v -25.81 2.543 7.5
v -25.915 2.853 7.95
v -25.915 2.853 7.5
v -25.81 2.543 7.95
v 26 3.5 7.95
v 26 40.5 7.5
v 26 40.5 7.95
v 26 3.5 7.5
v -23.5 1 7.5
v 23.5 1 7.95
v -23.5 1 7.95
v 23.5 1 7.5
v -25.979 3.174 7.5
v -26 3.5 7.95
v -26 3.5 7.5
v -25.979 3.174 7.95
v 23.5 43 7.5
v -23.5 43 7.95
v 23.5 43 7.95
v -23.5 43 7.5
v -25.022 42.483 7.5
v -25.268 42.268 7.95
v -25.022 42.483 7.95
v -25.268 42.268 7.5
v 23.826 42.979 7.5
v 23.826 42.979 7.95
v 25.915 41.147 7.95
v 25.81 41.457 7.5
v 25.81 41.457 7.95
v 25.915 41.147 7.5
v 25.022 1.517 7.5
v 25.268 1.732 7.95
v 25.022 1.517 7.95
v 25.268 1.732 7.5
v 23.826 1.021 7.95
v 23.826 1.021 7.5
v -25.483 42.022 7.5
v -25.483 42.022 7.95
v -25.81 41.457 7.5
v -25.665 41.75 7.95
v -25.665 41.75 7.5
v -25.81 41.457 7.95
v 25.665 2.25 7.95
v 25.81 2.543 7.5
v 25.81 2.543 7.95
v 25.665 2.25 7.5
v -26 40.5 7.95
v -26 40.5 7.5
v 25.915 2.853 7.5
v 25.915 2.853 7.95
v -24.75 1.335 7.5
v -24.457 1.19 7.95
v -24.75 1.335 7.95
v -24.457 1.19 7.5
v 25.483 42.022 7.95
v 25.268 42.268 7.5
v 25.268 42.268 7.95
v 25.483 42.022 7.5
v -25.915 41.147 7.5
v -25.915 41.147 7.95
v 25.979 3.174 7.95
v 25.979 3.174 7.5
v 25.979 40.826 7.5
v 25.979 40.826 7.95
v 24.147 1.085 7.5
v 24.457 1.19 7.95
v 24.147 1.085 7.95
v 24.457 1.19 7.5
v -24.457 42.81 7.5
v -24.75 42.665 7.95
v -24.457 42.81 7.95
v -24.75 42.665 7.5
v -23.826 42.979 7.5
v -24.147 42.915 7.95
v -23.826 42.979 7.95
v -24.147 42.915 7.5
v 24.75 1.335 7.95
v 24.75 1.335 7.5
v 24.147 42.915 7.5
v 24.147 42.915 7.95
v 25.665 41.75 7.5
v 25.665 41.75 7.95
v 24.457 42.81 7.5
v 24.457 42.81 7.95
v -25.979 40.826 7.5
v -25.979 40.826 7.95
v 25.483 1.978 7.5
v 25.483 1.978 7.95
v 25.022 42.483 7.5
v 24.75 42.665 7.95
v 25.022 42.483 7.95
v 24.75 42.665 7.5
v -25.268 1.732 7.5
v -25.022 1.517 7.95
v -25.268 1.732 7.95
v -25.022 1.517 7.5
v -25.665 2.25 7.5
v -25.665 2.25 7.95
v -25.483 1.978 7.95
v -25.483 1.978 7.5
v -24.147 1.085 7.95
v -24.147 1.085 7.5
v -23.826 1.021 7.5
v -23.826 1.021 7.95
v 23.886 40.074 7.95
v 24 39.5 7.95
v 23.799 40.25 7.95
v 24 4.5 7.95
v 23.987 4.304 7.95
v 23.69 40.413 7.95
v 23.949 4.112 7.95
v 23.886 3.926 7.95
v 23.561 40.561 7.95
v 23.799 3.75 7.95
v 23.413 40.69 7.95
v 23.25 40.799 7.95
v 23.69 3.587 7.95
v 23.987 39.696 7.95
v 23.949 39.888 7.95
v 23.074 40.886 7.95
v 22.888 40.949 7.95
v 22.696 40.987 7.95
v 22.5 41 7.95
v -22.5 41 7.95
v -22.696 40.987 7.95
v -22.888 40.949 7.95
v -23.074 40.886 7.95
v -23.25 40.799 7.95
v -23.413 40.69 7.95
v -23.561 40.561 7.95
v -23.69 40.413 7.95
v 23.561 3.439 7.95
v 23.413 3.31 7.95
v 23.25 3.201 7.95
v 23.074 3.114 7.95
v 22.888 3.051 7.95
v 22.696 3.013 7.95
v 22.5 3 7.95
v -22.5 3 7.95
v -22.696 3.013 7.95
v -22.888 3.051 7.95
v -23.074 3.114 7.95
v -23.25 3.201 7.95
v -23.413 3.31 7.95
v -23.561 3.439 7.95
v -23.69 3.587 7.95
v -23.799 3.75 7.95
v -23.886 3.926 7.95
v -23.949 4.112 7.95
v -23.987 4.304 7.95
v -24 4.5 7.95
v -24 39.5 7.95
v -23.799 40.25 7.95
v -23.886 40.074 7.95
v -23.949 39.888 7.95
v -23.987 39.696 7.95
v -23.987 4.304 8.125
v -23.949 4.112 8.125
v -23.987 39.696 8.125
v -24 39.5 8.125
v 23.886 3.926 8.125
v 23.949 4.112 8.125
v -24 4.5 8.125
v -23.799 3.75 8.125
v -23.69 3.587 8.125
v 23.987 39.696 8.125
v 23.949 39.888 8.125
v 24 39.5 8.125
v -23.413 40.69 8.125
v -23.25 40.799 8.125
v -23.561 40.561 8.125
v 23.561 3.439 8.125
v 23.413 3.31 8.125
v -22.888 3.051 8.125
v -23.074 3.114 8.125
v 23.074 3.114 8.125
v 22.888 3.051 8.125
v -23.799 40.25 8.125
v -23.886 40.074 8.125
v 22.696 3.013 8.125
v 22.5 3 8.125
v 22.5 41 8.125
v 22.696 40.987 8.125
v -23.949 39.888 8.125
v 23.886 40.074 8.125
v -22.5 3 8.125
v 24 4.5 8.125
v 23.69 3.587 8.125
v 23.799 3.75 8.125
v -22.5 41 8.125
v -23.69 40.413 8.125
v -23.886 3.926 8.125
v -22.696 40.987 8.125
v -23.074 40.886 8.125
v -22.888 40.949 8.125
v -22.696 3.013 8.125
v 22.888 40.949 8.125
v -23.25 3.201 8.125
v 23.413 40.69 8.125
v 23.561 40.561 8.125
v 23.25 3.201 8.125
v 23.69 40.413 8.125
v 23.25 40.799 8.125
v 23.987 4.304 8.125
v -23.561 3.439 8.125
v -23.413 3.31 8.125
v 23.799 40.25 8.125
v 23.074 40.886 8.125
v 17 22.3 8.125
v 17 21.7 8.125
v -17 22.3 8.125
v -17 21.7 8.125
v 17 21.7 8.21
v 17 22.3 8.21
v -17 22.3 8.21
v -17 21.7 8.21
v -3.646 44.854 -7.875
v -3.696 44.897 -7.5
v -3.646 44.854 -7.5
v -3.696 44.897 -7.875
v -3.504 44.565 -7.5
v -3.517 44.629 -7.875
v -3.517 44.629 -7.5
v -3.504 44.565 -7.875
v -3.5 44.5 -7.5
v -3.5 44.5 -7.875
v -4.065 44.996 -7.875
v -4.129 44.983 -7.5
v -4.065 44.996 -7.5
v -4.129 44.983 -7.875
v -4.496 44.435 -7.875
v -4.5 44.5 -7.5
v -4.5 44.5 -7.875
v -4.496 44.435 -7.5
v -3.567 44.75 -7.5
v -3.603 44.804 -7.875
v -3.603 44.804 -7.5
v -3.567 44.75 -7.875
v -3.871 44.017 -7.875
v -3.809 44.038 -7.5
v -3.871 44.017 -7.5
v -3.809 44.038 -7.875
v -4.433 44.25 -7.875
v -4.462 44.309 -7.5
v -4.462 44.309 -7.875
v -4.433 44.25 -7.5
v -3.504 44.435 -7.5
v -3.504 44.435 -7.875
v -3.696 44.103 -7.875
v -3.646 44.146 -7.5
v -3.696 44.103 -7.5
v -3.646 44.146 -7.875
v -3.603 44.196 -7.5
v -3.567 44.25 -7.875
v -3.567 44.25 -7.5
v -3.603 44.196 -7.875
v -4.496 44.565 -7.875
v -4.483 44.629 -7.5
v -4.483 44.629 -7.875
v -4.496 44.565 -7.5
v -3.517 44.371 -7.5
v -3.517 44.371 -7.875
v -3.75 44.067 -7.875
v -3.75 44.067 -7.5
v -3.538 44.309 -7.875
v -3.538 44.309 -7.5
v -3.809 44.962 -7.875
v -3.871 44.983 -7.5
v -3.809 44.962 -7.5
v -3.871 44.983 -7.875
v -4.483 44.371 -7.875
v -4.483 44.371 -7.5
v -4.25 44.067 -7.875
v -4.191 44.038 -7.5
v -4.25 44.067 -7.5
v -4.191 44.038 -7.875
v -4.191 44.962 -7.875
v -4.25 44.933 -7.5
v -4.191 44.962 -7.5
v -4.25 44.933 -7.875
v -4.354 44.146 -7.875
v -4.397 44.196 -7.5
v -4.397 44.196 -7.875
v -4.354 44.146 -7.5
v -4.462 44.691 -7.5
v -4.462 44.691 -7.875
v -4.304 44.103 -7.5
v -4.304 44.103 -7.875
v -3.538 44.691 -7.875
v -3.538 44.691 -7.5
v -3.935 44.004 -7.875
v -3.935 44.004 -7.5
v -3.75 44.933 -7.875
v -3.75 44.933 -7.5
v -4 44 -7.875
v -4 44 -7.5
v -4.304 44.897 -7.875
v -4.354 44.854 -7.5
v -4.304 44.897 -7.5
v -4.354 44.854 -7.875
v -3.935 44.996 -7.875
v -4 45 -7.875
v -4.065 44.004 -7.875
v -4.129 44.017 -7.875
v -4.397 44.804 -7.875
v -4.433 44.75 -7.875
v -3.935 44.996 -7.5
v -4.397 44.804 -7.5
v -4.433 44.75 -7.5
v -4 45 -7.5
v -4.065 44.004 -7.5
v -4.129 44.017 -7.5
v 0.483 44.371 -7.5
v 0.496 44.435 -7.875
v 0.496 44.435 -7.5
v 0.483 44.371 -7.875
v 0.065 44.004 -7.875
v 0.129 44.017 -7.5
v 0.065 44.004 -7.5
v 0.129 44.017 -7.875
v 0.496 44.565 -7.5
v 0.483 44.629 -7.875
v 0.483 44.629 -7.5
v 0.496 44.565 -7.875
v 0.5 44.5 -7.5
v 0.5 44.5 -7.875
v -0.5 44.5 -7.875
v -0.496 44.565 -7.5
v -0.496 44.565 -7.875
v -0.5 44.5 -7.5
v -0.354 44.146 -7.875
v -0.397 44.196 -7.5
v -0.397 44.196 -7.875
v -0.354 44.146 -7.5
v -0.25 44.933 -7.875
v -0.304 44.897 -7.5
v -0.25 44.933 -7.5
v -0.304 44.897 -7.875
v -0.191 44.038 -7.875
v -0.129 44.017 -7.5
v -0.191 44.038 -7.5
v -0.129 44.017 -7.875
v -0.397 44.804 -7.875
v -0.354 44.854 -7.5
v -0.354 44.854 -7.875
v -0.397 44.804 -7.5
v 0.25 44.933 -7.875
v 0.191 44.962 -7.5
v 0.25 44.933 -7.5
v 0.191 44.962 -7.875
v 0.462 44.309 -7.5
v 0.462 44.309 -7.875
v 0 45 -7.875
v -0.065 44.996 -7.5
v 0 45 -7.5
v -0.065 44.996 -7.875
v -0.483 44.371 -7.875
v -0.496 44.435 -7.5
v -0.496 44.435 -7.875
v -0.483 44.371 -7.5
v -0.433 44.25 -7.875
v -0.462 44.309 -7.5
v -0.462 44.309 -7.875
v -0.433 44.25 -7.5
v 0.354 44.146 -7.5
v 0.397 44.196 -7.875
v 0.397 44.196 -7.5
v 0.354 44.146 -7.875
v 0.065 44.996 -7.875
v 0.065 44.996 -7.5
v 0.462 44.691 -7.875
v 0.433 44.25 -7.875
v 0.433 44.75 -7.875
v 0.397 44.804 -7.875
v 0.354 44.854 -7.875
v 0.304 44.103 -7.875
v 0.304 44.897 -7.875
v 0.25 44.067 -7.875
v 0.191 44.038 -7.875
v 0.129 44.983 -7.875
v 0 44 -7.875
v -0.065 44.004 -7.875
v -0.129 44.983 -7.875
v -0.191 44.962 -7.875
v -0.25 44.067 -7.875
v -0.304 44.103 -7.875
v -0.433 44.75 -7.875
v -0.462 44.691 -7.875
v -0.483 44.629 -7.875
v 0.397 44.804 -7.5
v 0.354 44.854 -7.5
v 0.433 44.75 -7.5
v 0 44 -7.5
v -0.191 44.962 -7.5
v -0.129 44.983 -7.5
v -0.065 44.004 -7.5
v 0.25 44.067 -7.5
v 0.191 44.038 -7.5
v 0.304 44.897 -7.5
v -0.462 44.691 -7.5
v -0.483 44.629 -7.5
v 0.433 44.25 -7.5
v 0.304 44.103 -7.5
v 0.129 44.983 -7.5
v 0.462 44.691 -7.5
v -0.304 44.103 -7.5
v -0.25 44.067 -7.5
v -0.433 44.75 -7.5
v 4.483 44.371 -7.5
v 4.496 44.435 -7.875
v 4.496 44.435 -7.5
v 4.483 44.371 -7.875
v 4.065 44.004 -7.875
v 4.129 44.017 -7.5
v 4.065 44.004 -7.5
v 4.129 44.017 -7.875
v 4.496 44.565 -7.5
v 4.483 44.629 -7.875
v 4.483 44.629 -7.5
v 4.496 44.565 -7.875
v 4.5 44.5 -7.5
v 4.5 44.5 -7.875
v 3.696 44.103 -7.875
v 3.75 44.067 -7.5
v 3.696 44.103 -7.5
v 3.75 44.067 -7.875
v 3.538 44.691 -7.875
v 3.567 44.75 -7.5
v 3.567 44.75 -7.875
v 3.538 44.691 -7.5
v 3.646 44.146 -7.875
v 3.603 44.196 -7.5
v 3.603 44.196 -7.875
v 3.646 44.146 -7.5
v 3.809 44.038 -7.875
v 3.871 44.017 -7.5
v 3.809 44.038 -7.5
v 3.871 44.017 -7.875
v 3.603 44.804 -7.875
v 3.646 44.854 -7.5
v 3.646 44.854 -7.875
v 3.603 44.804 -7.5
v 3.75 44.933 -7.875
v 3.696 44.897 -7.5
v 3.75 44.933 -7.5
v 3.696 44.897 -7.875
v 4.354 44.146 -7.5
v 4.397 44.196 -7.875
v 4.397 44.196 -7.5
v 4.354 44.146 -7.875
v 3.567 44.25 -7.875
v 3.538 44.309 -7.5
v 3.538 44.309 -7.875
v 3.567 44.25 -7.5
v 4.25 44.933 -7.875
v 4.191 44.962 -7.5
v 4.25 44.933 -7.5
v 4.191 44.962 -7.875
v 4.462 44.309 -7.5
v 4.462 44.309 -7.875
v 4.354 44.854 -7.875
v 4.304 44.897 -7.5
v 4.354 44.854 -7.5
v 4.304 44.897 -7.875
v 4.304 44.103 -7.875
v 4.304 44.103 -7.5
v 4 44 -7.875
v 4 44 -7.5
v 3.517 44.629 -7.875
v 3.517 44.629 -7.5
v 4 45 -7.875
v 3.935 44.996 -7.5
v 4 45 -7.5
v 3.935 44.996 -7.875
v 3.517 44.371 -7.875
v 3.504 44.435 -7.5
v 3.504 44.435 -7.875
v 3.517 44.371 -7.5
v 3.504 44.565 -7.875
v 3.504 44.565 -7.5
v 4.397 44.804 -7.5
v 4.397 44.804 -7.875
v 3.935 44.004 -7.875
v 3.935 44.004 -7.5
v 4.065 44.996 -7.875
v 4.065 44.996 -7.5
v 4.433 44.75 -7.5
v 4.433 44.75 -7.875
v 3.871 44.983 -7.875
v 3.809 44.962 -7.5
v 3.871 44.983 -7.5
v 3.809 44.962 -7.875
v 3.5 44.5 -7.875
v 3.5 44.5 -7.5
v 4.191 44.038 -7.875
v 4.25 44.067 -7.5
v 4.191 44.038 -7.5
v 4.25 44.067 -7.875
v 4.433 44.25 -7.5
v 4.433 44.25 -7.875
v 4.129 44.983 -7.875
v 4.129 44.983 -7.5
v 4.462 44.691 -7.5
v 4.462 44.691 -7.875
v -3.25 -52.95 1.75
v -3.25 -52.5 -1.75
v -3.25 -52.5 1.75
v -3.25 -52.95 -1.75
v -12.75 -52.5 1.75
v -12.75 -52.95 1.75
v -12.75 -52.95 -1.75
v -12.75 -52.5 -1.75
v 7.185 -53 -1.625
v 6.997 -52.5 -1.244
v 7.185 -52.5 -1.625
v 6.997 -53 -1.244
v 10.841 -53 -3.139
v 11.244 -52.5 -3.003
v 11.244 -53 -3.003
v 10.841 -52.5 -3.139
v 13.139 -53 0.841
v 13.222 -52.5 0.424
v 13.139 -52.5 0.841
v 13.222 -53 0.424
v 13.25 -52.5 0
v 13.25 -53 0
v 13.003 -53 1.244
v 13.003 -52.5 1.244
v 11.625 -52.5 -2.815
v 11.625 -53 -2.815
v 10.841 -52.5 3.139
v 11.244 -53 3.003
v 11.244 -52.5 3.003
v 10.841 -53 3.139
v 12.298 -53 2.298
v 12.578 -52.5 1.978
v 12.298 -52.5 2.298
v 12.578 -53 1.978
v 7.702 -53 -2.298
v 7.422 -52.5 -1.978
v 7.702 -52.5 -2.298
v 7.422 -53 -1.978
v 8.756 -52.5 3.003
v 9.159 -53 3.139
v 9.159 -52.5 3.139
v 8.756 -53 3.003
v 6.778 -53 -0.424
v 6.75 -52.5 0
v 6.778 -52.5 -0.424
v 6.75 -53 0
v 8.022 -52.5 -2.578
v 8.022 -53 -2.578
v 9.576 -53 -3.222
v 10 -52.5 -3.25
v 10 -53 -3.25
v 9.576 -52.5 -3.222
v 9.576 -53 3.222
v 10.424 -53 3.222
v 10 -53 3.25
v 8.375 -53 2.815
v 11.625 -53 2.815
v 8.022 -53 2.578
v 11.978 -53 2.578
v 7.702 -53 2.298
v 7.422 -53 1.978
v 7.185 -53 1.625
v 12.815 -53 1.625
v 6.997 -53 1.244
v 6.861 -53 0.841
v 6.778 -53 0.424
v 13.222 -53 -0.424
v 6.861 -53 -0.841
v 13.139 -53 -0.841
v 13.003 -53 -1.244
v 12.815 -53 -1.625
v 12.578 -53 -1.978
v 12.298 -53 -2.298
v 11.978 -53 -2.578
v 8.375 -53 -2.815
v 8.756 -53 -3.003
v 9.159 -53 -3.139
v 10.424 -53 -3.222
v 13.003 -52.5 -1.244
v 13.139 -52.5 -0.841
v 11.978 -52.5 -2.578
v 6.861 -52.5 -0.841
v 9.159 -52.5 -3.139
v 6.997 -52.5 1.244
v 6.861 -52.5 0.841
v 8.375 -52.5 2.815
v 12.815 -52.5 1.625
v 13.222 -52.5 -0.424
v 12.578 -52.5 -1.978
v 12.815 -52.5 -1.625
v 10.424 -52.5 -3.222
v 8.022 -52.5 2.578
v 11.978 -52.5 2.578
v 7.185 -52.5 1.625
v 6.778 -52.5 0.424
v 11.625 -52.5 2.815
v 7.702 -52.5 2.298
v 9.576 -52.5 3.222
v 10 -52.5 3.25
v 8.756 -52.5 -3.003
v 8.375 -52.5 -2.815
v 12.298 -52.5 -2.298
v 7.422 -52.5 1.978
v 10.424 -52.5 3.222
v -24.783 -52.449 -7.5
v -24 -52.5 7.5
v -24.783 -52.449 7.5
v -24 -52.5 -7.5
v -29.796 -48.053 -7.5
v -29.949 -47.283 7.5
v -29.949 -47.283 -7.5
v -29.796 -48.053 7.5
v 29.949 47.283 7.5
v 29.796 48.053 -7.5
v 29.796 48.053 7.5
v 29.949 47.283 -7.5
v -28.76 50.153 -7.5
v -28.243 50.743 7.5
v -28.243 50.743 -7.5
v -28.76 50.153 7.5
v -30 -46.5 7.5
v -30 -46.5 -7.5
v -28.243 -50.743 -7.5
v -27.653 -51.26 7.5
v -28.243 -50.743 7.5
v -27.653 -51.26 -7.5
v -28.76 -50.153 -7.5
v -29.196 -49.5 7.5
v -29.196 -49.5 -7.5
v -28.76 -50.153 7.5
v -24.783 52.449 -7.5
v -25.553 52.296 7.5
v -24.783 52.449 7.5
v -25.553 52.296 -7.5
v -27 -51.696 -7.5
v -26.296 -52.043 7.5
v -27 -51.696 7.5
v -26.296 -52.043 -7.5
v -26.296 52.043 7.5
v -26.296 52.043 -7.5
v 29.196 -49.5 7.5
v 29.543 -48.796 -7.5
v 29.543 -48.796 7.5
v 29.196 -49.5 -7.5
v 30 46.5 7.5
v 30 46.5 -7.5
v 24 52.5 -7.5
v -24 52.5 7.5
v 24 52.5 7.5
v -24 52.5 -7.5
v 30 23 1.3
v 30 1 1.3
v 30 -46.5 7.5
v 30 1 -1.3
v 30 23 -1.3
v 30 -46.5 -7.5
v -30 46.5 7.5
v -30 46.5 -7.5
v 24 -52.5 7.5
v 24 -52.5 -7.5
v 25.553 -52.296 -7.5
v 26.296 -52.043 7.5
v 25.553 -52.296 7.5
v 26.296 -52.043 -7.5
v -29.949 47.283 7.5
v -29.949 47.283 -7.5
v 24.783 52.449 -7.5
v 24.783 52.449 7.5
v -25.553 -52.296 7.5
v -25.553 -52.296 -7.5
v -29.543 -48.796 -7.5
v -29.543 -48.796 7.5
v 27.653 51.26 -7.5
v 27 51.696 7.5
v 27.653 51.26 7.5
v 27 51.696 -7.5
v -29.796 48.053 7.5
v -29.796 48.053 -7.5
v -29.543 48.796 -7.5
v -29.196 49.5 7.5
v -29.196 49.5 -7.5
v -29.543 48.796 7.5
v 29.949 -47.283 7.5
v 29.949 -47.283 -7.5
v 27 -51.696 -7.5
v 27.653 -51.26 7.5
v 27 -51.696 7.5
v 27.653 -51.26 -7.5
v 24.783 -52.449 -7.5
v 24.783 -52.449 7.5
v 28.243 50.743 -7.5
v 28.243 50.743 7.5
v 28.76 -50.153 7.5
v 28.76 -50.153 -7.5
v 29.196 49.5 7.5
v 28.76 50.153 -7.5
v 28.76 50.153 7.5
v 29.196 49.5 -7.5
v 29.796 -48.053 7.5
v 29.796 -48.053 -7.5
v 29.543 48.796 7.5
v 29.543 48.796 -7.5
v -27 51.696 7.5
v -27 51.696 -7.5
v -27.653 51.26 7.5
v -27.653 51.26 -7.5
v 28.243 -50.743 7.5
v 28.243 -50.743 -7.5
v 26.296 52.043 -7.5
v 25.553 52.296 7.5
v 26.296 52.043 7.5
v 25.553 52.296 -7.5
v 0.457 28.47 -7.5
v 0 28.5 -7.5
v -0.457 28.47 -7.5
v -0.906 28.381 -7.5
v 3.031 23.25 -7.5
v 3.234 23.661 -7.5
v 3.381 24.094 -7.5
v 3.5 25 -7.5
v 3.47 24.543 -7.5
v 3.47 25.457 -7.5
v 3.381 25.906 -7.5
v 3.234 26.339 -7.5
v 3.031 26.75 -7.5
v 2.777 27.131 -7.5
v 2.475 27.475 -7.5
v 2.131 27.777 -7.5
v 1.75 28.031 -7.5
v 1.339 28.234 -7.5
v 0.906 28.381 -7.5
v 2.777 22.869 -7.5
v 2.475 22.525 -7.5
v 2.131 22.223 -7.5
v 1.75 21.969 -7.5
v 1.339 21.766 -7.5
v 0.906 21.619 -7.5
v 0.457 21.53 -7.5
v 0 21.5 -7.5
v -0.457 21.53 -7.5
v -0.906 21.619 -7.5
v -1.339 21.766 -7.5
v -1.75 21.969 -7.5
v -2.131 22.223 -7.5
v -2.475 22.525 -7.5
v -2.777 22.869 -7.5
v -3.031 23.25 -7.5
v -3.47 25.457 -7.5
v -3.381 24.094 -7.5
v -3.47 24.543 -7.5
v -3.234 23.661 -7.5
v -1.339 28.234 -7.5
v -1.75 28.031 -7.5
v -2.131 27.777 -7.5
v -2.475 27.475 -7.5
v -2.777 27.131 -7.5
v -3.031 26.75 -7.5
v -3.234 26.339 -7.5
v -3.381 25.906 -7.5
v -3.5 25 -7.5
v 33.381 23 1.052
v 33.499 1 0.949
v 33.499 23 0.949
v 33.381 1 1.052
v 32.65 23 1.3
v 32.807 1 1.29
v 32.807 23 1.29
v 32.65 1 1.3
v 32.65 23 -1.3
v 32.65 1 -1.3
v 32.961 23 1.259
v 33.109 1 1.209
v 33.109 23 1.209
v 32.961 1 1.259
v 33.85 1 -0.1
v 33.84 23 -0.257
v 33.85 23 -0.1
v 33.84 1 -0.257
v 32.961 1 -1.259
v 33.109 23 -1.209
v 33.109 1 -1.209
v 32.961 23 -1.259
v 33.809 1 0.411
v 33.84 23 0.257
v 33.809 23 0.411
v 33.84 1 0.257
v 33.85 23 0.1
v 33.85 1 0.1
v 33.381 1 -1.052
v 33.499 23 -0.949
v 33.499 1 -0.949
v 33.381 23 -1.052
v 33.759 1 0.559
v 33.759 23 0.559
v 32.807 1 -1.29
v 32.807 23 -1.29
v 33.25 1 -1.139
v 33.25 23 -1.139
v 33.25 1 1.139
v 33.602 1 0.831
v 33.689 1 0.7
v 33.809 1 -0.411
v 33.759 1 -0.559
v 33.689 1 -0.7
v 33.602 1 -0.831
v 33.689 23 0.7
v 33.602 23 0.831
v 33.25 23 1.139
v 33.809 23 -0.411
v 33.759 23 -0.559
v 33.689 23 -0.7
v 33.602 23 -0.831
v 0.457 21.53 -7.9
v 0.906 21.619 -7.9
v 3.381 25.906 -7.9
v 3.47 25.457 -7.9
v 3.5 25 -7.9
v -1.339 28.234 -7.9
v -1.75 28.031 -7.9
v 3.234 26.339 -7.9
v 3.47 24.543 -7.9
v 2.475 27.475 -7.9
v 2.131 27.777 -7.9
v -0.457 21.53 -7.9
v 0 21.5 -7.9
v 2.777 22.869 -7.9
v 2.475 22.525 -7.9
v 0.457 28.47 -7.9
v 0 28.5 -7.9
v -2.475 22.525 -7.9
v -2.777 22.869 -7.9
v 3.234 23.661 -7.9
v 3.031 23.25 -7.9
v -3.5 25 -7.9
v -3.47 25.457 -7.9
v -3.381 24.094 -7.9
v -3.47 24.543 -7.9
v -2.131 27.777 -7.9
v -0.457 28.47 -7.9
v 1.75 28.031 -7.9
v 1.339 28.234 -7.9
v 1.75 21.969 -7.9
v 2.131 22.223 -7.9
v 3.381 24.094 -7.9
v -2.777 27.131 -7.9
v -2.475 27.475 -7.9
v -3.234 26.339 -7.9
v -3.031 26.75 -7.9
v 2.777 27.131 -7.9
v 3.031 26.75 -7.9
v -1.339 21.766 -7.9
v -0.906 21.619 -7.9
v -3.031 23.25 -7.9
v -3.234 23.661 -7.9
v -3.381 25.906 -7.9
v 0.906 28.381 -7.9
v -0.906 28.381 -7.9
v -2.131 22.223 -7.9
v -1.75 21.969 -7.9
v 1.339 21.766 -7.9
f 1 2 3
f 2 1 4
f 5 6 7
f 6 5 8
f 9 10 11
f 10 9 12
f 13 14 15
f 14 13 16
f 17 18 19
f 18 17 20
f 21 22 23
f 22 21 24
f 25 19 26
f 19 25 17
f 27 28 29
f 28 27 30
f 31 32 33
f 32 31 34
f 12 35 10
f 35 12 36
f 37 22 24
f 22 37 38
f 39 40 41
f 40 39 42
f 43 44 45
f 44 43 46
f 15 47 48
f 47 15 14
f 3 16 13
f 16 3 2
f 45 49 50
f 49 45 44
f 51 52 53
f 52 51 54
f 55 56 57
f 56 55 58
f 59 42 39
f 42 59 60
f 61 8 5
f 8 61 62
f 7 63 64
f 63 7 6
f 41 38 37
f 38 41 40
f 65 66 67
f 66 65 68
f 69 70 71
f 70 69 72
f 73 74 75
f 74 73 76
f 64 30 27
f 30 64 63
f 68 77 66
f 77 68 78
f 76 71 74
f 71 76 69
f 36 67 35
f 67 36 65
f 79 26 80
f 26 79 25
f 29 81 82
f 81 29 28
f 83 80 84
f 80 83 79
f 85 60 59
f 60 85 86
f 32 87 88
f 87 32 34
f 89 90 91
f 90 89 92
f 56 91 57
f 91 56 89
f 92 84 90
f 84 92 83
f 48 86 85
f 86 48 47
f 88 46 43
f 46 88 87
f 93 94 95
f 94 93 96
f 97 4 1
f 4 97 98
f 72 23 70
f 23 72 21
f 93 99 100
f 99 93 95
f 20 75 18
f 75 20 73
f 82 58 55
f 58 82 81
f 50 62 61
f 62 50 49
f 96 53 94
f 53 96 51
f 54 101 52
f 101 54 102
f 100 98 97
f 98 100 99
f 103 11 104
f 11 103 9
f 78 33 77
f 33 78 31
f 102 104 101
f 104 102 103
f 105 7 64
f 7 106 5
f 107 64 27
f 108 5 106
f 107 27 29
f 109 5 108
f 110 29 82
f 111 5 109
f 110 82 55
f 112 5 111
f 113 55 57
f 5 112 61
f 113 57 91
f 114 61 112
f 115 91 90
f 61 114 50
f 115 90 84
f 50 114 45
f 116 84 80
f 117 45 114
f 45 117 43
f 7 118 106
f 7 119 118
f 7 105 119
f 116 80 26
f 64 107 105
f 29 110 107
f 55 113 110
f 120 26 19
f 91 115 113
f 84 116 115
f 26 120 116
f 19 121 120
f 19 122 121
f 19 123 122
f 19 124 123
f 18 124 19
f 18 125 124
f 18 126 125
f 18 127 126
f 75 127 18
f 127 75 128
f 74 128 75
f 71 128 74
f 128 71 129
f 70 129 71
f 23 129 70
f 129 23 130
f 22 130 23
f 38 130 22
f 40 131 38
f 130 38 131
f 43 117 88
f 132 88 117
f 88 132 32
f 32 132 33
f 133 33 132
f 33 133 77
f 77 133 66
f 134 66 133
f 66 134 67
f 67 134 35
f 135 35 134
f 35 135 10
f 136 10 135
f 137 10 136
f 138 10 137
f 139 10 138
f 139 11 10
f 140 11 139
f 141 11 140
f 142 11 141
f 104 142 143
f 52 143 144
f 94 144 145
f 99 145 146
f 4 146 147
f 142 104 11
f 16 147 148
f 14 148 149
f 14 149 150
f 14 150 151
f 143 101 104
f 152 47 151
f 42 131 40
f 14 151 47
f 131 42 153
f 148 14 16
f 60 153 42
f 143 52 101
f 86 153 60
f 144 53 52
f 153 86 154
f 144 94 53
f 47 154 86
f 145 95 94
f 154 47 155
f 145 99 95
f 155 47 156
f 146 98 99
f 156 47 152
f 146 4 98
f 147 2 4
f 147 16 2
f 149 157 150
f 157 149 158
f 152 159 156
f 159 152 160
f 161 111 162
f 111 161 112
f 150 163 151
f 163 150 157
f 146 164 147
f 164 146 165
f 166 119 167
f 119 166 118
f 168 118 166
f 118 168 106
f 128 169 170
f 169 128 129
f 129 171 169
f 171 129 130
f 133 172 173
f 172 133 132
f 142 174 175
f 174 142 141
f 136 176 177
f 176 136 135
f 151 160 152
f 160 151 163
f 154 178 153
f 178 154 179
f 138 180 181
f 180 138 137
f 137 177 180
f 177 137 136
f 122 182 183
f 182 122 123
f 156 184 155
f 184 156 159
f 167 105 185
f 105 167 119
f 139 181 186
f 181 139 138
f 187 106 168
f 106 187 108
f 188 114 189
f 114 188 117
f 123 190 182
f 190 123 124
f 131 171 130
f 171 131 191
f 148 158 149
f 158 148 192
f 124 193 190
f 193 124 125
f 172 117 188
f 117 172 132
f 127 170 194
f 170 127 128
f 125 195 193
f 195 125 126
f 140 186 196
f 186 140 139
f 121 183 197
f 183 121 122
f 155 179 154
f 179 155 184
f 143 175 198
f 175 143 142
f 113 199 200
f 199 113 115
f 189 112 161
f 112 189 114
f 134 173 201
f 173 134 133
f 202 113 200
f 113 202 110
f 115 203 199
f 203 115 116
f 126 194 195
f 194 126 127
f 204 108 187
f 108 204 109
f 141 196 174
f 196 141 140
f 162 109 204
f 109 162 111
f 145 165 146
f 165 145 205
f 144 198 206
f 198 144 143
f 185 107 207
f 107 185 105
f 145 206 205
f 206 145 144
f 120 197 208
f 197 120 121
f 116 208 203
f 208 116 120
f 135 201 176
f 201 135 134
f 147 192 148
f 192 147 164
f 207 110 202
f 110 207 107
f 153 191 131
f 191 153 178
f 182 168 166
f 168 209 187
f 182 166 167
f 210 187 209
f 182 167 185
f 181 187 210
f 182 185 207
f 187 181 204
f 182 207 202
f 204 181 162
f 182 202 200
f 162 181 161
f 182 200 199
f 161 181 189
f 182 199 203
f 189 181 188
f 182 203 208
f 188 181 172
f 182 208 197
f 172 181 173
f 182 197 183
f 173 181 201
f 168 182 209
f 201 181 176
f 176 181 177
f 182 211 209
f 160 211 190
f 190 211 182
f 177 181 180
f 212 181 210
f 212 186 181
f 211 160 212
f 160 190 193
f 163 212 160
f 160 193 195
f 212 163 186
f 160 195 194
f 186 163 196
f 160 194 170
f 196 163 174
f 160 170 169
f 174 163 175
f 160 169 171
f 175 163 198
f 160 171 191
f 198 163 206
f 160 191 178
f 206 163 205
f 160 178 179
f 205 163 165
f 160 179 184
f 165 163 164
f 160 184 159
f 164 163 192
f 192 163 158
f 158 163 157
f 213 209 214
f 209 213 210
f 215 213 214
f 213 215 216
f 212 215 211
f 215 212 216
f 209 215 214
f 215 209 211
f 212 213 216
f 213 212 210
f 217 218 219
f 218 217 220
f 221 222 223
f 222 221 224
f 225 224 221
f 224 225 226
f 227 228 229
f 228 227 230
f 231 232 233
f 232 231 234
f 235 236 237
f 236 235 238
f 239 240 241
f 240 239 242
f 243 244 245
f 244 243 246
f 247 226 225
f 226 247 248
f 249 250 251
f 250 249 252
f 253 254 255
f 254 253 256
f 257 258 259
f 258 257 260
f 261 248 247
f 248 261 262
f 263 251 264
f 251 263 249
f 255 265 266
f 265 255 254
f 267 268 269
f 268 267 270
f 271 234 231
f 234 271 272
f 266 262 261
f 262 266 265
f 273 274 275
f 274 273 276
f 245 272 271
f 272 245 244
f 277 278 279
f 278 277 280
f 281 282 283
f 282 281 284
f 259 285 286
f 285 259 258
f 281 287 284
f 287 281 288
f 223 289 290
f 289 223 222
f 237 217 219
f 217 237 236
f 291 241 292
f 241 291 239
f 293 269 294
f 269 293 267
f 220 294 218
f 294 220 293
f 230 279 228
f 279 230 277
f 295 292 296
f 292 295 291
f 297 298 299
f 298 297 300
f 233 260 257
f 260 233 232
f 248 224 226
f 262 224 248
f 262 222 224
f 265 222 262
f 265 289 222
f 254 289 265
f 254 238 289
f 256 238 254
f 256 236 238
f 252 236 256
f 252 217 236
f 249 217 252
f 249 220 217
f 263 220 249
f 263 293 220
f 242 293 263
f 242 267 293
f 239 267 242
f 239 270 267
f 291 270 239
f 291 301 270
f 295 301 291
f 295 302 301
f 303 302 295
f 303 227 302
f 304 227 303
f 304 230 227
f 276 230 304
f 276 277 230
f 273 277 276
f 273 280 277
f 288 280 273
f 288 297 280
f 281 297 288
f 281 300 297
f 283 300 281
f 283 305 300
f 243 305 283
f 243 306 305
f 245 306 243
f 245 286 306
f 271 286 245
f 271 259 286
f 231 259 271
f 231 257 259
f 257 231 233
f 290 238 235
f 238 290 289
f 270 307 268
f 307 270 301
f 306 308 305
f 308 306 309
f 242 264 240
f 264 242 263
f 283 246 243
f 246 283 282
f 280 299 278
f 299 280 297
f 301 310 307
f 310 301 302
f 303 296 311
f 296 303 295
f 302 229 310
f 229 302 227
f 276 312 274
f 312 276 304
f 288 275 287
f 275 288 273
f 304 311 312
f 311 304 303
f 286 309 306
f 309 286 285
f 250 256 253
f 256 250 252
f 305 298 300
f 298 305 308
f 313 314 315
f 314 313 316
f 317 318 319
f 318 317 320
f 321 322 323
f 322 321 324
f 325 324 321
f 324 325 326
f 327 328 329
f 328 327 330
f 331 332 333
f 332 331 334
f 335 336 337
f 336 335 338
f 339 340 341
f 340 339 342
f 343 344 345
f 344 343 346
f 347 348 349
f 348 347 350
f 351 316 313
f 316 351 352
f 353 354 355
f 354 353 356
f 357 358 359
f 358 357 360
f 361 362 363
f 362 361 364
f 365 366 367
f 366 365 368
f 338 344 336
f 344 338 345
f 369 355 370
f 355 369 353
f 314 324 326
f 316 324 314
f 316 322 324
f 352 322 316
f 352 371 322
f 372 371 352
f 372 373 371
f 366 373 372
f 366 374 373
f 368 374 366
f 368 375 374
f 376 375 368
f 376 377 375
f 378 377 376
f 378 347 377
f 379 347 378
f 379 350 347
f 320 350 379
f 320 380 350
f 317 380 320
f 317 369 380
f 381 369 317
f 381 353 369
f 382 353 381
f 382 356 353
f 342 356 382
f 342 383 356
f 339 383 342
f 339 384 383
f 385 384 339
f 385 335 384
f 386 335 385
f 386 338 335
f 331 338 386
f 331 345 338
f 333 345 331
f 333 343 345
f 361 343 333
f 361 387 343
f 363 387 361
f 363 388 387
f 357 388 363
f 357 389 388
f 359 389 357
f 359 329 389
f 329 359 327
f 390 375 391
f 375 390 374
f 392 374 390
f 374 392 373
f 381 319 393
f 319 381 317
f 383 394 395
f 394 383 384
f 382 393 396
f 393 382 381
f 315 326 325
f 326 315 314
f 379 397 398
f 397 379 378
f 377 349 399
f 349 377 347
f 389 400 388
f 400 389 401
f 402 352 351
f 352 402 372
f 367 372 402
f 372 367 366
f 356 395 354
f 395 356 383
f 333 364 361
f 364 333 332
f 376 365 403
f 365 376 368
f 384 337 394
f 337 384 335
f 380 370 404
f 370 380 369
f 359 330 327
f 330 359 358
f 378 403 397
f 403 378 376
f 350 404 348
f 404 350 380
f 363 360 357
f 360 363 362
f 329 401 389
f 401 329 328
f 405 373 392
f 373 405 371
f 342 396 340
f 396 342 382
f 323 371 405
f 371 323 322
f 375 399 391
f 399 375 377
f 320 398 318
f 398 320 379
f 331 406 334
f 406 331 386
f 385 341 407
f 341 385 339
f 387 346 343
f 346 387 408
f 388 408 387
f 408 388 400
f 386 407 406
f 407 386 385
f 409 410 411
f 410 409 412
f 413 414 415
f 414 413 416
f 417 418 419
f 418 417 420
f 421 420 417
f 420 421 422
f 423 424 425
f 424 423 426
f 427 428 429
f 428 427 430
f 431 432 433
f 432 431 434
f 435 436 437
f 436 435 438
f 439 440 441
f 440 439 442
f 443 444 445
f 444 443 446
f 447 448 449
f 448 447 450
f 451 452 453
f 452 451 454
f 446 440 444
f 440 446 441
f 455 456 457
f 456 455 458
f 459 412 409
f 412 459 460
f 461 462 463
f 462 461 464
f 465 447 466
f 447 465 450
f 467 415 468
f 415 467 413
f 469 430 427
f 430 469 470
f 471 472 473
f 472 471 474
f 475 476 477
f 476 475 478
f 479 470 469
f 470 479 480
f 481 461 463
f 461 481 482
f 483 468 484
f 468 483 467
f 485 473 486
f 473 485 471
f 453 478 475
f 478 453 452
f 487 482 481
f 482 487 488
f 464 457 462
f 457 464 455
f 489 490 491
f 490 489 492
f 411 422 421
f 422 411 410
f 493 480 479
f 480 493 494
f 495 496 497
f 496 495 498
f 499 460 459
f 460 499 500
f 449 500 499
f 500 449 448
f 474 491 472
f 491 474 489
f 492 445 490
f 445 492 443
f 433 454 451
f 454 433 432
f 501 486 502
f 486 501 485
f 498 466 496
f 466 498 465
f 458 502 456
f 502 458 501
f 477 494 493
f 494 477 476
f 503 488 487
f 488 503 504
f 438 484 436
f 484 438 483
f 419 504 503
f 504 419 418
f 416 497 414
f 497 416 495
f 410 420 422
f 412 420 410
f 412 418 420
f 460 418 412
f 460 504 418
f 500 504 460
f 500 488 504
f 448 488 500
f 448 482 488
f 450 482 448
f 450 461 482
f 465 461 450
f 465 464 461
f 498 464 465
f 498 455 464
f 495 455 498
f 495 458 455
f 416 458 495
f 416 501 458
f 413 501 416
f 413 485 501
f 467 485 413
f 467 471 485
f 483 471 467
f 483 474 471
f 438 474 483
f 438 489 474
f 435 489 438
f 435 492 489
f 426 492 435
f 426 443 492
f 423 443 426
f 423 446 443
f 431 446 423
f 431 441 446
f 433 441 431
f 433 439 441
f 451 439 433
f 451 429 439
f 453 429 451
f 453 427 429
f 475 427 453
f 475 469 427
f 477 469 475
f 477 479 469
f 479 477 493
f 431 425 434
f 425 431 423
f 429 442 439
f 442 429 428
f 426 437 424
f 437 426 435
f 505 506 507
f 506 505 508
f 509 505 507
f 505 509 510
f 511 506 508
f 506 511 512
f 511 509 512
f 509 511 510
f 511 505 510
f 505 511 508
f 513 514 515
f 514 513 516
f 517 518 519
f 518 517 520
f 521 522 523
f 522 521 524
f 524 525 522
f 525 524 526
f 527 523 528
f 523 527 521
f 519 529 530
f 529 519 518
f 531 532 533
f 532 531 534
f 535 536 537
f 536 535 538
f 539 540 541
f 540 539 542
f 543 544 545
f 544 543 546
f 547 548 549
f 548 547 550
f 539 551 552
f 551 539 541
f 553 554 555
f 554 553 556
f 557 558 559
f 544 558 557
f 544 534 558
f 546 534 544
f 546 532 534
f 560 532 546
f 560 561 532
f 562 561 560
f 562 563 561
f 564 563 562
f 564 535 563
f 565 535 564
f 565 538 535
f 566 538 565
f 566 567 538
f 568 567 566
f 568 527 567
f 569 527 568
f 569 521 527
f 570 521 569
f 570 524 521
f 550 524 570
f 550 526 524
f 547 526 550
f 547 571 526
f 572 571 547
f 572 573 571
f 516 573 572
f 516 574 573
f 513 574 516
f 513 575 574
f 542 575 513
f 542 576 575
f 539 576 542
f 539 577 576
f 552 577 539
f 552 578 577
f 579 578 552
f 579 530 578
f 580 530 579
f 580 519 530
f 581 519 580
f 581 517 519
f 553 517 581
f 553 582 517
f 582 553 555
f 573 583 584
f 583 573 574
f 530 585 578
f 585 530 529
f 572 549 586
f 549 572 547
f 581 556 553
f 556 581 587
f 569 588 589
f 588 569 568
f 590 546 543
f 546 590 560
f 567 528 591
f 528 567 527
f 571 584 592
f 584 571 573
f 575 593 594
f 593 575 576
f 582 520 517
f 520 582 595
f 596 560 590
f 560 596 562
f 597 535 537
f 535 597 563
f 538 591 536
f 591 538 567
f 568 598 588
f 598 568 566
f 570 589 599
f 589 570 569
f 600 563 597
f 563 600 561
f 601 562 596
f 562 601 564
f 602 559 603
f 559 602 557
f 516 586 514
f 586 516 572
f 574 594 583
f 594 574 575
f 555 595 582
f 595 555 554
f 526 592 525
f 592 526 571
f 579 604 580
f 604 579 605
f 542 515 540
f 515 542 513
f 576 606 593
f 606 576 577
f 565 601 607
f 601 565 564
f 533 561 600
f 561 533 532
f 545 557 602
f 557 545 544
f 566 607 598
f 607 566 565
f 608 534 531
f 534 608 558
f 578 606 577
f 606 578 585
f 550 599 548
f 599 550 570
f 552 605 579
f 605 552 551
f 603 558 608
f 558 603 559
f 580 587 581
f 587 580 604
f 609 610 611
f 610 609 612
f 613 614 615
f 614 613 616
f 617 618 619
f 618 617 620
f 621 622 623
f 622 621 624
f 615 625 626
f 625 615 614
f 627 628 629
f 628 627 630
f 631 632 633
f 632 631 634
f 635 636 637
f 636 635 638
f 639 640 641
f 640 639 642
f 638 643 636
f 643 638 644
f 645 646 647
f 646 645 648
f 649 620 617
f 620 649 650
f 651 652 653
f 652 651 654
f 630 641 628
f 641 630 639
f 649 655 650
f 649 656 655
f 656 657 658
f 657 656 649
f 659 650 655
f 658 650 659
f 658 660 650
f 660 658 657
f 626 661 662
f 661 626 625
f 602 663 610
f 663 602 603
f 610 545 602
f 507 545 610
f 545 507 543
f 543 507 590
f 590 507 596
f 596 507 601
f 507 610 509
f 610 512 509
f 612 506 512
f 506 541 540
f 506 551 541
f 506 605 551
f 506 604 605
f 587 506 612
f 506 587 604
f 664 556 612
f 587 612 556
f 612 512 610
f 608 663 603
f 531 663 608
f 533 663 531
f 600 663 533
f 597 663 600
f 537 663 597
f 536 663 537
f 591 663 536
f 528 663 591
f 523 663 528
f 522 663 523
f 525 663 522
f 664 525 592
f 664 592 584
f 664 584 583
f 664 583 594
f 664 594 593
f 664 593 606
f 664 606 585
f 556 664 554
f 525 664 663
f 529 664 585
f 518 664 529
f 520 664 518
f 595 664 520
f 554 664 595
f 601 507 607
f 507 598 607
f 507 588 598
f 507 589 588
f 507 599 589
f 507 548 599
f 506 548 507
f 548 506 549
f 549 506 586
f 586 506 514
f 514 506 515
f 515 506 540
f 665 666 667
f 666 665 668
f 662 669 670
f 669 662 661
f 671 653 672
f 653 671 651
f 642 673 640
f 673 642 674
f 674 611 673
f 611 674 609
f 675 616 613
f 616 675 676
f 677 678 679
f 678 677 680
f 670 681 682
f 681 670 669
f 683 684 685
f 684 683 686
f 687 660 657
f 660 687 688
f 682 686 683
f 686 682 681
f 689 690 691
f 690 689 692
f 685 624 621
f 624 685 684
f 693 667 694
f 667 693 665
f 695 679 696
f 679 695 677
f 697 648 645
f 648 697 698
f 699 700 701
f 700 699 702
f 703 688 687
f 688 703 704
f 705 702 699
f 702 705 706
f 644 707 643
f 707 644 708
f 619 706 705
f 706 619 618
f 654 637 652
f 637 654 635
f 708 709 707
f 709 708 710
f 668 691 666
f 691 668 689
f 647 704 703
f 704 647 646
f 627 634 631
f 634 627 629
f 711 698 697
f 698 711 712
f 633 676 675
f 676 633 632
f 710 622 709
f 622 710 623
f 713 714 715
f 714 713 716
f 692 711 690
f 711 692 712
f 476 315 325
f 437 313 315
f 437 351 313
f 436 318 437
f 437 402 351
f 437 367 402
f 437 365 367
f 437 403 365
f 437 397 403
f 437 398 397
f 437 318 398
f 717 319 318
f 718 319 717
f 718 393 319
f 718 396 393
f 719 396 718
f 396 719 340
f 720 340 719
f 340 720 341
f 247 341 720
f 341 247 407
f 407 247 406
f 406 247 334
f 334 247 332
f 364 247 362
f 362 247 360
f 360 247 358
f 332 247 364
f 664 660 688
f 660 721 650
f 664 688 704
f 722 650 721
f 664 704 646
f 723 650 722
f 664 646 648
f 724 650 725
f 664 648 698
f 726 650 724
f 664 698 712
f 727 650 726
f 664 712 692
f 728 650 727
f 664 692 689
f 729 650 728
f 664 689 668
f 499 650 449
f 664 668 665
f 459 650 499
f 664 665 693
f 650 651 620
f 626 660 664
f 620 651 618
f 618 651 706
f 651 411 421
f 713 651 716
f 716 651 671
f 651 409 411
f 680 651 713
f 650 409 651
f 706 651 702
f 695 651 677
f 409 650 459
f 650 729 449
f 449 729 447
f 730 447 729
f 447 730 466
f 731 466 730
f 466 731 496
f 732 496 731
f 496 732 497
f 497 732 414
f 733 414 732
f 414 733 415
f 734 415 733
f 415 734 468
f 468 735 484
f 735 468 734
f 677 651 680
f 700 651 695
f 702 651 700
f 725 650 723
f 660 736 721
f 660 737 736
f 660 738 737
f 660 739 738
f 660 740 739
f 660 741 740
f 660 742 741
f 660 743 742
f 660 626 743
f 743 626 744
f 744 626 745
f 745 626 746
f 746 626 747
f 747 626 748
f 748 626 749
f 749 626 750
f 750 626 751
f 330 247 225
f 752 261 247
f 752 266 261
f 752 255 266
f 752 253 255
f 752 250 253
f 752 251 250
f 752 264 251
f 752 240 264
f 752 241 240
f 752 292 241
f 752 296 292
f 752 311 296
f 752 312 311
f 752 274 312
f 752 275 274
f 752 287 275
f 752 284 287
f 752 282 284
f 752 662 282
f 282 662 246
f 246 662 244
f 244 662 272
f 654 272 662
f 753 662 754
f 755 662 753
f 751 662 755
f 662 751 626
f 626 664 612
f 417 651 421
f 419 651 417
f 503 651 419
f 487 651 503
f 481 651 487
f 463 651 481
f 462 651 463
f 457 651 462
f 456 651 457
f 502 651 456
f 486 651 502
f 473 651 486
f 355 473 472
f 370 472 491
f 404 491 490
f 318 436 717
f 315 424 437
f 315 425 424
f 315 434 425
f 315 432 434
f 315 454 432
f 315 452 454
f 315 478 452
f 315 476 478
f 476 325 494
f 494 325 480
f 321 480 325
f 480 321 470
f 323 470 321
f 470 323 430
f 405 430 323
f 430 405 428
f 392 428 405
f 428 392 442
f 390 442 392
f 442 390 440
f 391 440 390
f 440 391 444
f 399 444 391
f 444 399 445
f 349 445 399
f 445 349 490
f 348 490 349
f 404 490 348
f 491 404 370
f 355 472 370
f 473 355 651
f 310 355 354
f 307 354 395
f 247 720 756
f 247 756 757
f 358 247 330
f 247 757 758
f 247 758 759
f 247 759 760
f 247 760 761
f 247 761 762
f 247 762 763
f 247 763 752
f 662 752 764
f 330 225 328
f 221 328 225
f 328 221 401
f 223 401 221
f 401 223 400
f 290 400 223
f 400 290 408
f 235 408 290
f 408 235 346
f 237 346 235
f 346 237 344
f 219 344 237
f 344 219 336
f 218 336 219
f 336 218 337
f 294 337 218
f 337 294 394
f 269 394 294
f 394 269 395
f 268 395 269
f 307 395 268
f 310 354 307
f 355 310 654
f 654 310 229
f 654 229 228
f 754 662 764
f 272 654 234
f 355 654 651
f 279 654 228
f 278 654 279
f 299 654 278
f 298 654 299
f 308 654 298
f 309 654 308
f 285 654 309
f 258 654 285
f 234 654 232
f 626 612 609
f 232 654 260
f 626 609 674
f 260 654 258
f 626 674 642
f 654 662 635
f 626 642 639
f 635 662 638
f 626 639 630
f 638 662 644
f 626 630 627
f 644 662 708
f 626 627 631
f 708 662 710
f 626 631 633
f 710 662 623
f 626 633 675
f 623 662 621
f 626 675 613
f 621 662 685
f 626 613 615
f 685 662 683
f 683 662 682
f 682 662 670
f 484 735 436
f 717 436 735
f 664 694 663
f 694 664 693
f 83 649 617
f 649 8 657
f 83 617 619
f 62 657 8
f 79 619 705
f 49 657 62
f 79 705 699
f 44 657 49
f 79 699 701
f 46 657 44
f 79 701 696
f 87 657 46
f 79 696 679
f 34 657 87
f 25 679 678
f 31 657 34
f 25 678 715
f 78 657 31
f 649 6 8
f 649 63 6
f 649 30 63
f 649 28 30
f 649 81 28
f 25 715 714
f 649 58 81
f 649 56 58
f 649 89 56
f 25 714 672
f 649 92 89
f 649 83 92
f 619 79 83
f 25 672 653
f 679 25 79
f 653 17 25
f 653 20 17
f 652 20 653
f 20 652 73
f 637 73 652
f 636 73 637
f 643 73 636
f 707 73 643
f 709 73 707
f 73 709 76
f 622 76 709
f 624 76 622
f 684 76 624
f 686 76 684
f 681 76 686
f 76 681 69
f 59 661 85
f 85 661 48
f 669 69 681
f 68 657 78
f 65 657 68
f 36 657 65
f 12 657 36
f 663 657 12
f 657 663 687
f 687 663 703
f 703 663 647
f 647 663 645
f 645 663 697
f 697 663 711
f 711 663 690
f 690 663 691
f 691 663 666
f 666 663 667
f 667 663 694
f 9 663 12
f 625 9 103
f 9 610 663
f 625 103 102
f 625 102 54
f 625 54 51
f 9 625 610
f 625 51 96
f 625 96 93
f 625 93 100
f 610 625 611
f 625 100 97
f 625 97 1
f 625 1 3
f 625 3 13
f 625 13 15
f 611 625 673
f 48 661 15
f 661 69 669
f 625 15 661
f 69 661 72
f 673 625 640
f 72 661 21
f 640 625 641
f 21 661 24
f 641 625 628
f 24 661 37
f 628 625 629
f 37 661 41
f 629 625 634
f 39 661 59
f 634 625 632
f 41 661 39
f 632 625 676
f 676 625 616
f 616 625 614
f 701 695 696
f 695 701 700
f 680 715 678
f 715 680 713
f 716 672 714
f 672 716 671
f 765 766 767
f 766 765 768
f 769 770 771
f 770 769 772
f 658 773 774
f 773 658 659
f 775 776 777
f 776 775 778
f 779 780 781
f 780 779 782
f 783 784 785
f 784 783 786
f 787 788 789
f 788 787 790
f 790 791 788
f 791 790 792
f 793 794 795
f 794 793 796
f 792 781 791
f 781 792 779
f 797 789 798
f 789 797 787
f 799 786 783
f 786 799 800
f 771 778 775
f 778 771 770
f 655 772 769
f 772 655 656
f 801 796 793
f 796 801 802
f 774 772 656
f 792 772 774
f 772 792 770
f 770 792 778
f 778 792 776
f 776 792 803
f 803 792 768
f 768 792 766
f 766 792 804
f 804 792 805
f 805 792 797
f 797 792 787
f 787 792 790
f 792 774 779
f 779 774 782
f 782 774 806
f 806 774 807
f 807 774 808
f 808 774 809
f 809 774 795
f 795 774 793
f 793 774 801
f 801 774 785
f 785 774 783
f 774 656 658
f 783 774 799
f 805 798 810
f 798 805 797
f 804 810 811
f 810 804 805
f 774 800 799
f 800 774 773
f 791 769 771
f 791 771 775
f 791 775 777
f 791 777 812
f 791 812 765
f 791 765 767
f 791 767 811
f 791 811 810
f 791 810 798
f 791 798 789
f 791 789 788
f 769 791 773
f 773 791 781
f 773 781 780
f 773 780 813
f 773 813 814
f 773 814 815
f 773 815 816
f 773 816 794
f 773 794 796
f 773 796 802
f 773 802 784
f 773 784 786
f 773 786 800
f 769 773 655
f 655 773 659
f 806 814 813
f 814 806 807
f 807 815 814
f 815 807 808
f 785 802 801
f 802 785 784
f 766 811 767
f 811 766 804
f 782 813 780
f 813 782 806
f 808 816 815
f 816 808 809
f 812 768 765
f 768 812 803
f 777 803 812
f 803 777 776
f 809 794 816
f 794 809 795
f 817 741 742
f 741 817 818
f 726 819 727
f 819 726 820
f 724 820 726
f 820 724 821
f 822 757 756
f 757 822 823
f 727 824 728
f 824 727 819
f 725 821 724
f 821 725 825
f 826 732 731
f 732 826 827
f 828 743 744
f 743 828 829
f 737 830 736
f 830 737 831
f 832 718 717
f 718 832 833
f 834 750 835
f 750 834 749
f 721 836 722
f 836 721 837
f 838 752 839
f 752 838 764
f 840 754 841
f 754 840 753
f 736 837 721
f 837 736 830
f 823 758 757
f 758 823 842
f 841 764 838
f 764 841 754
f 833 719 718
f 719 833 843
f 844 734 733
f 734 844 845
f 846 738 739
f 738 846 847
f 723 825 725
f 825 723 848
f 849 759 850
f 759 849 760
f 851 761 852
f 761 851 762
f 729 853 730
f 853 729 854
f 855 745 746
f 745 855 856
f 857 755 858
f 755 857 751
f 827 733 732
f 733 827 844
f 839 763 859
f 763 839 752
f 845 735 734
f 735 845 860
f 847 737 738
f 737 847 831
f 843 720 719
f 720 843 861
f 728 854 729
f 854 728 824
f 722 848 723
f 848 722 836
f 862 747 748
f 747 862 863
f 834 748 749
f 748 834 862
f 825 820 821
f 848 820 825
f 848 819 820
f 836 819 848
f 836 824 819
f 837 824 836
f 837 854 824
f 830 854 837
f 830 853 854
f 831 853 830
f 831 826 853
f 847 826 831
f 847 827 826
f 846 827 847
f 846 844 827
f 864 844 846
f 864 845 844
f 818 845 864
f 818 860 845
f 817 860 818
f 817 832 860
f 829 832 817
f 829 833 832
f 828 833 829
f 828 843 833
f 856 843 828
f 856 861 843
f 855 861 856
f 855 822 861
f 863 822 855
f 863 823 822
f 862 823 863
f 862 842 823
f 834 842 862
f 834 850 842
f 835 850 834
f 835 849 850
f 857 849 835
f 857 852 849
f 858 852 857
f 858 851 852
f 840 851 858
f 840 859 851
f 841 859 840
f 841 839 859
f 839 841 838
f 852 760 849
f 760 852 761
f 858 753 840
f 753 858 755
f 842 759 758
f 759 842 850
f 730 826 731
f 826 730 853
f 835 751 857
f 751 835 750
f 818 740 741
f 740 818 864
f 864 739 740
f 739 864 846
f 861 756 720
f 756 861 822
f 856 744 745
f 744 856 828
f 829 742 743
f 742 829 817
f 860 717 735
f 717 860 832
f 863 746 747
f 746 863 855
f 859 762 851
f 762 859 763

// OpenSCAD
// yadiggg V1 Block Model
// Status: active-draft / spatial proof only
// Units: millimeters
// Source: physical-design/cad-block-model-brief.md
//
// This is NOT production CAD. It is a fast parametric block model for
// checking the canonical 105 x 60 x 15mm-class visual/mechanical envelope.

$fn = 48;

// -----------------------------
// Global parameters
// -----------------------------
body_w = 60;
body_h = 105;
body_d = 15;
corner_r = 6;
shell_alpha = 0.36;

// Front features
display_w = 48;
display_h = 38;
display_y = 22;
display_bezel = 2;
display_depth = 0.6;

// Internal blocks
pcba_w = 52;
pcba_h = 86;
pcba_d = 1.6;
battery_w = 38;
battery_h = 48;
battery_d = 5;

// Side control
control_w = 2.2;
control_h = 22;
control_d = 7;
control_y = 12;

// Back camera
camera_dia = 7;
camera_y = 25;

// Ports
usb_w = 9.5;
usb_h = 3.5;
jack_dia = 6.5;

// -----------------------------
// Helpers
// -----------------------------
module rounded_box(w, h, d, r) {
    linear_extrude(height=d, center=true)
        hull() {
            translate([ w/2-r,  h/2-r]) circle(r=r);
            translate([-w/2+r,  h/2-r]) circle(r=r);
            translate([ w/2-r, -h/2+r]) circle(r=r);
            translate([-w/2+r, -h/2+r]) circle(r=r);
        }
}

module rounded_rect_panel(w, h, t, r) {
    linear_extrude(height=t, center=true)
        hull() {
            translate([ w/2-r,  h/2-r]) circle(r=r);
            translate([-w/2+r,  h/2-r]) circle(r=r);
            translate([ w/2-r, -h/2+r]) circle(r=r);
            translate([-w/2+r, -h/2+r]) circle(r=r);
        }
}

// -----------------------------
// Main shell
// -----------------------------
module body_shell() {
    color([0.18, 0.20, 0.20, shell_alpha])
        rounded_box(body_w, body_h, body_d, corner_r);
}

module display_assembly() {
    // black bezel
    color([0.02, 0.02, 0.02, 1.0])
        translate([0, display_y, body_d/2 + 0.15])
            rounded_rect_panel(display_w + display_bezel*2, display_h + display_bezel*2, display_depth, 2.5);

    // LCD face
    color([0.78, 0.82, 0.74, 1.0])
        translate([0, display_y, body_d/2 + 0.5])
            rounded_rect_panel(display_w, display_h, 0.25, 1.5);

    // simple waveform placeholder
    color([0.02, 0.02, 0.02, 1.0])
        translate([0, display_y, body_d/2 + 0.66])
            cube([34, 0.6, 0.1], center=true);
}

module internal_blocks() {
    // main PCBA
    color([0.02, 0.16, 0.08, 0.75])
        translate([0, -5, 1.0])
            cube([pcba_w, pcba_h, pcba_d], center=true);

    // lower shield zone
    color([0.03, 0.03, 0.03, 0.85])
        translate([-10, -24, 3.5])
            cube([24, 24, 2.0], center=true);

    // battery rear/lower volume
    color([0.12, 0.12, 0.12, 0.70])
        translate([8, -25, -3.6])
            cube([battery_w, battery_h, battery_d], center=true);
}

module side_control() {
    color([1.0, 0.55, 0.05, 1.0])
        translate([body_w/2 + 0.35, control_y, 0])
            rotate([90, 0, 0])
                rounded_rect_panel(control_d, control_w, control_h, 1.2);
}

module rear_camera() {
    color([0.01, 0.01, 0.01, 1.0])
        translate([0, camera_y, -body_d/2 - 0.15])
            cylinder(h=0.5, d=camera_dia, center=true);
}

module mic_ports() {
    color([0.01, 0.01, 0.01, 1.0]) {
        translate([-4, body_h/2 - 8, -body_d/2 - 0.15]) cylinder(h=0.45, d=1.0, center=true);
        translate([0, body_h/2 - 8, -body_d/2 - 0.15]) cylinder(h=0.45, d=1.0, center=true);
        translate([4, body_h/2 - 8, -body_d/2 - 0.15]) cylinder(h=0.45, d=1.0, center=true);
    }
}

module bottom_ports() {
    // USB-C opening representation on bottom edge
    color([0.01, 0.01, 0.01, 1.0])
        translate([-8, -body_h/2 - 0.2, 0])
            cube([usb_w, 0.5, usb_h], center=true);

    // optional 3.5mm jack representation on bottom edge
    color([0.01, 0.01, 0.01, 1.0])
        translate([10, -body_h/2 - 0.2, 0])
            rotate([90, 0, 0])
                cylinder(h=0.6, d=jack_dia, center=true);
}

module rf_keepout_zone() {
    color([0.6, 1.0, 0.2, 0.18])
        translate([body_w/2 - 9, body_h/2 - 10, -1.0])
            cube([12, 14, 6], center=true);
}

module yadiggg_block_model() {
    body_shell();
    internal_blocks();
    display_assembly();
    side_control();
    rear_camera();
    mic_ports();
    bottom_ports();
    rf_keepout_zone();
}

yadiggg_block_model();
